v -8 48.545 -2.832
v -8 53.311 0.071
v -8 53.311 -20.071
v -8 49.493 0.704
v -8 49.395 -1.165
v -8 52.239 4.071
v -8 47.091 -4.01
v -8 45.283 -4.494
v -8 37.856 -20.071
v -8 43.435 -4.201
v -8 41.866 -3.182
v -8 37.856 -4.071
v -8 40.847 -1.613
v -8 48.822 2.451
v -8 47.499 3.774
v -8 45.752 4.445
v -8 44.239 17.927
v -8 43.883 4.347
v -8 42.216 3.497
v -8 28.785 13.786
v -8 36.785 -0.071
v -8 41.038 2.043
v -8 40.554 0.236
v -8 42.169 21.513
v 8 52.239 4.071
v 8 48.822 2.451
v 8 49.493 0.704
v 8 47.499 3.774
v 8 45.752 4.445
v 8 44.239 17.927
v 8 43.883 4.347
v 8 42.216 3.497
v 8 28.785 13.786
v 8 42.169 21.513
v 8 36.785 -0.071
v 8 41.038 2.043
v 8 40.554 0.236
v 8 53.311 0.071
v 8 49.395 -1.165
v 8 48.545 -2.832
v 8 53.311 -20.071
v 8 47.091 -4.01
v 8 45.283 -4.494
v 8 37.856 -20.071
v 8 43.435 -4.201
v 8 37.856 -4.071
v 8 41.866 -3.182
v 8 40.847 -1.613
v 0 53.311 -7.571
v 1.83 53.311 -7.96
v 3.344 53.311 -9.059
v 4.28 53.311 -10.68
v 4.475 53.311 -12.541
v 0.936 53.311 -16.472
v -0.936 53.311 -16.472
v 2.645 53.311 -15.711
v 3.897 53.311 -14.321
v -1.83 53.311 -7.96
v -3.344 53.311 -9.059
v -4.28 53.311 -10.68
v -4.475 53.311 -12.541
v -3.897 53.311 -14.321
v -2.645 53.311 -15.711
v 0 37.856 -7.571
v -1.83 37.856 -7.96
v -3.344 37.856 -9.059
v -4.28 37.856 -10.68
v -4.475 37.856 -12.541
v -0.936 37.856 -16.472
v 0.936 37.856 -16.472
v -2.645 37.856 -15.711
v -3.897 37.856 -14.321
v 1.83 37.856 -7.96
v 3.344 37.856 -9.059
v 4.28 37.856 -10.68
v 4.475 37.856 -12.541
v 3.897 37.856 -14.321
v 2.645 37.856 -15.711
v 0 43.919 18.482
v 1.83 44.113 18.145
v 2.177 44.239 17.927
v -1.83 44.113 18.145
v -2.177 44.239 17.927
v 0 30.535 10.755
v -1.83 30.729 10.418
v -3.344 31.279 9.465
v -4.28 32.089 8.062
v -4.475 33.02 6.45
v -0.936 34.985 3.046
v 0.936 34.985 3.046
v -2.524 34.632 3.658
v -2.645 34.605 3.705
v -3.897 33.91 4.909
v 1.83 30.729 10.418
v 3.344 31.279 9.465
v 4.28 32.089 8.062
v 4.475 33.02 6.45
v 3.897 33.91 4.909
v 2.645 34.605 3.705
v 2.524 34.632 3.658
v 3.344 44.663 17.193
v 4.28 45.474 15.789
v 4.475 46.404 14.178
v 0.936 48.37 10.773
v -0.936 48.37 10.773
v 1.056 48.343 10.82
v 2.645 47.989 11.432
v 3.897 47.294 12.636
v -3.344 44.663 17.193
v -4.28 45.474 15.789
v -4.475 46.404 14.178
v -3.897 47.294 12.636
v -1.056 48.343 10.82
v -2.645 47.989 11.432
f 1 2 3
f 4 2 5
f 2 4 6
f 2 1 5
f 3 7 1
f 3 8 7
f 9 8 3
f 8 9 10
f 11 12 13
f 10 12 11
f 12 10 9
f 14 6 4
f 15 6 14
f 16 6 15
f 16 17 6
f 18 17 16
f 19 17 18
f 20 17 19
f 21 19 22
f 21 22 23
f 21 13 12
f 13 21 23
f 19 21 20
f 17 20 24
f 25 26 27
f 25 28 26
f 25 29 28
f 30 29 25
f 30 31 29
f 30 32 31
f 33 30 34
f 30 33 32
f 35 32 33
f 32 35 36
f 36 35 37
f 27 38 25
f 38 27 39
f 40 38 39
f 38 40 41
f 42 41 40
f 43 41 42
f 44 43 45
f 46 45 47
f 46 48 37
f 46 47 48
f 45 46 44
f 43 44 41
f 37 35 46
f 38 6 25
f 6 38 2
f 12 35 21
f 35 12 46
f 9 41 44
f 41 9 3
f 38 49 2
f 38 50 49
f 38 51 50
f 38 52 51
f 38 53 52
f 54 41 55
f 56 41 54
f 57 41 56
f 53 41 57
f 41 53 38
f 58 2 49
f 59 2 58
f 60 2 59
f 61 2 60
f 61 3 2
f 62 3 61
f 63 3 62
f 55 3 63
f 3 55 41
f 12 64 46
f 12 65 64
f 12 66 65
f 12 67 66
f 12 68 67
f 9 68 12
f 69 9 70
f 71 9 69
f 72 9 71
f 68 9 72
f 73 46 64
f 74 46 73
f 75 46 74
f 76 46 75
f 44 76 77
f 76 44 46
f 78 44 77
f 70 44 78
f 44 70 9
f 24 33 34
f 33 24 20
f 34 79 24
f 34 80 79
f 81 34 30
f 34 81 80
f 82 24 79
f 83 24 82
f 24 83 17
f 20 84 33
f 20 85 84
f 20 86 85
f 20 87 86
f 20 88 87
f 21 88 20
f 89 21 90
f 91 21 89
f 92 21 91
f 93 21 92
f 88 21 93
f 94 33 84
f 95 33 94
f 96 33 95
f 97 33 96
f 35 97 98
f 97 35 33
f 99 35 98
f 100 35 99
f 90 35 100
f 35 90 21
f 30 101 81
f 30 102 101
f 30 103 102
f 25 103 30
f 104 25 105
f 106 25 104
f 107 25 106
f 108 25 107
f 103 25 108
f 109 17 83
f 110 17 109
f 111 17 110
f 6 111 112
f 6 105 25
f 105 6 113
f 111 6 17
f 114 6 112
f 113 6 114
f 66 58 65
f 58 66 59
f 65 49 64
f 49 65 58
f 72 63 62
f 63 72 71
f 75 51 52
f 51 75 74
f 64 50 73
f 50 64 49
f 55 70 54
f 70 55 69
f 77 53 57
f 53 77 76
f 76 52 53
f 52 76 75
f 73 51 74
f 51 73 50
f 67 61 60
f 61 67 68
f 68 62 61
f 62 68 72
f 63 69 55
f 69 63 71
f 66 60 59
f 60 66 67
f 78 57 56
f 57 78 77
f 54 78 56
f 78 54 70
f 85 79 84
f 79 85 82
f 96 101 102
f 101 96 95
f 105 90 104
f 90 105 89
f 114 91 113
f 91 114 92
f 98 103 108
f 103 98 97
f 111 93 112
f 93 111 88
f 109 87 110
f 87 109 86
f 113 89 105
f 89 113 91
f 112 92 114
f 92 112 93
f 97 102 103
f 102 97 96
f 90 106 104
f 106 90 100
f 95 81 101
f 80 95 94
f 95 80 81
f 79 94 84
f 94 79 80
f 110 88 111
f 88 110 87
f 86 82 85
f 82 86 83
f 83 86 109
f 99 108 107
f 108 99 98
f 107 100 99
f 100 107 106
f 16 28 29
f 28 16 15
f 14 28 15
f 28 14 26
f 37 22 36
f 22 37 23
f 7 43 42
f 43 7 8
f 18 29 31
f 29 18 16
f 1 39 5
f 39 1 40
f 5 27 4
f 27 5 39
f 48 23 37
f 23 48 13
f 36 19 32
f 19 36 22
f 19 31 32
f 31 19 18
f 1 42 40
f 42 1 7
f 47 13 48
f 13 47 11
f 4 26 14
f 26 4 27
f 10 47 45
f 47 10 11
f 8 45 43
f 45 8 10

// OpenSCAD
h=8;
w=16;
a=15;
d=9;
machine_width=150;
function vertex_thickness(a)=w*cos(a);
function vertex_pivot_long(a)=0.5*w/sin(a)+h*cos(a)+w/2;
function vertex_pivot_short(a)=0.5*w/tan(a)+h+w*cos(a)/2;
function vertex_width(a)=cos(2*a)*0.5*w/tan(a)-0.5*w*sin(2*a)-vertex_pivot_short(a)-vertex_thickness(a)/2;
function between_rods(a)=vertex_pivot_long(a)*sin(a);
module vertex(a){
  difference() {
    union() {
      rotate([0,0,-a])translate([0,vertex_pivot_long(a),0])cube([2*h*sin(a),w,w],center=true);
      translate([0,vertex_pivot_short(a),0])cube([w,w*cos(a),w],center=true);
      translate([w*sin(a),vertex_pivot_short(a),0])cube([w,w*cos(a),w],center=true);
      rotate([0,0,-2*a])translate([0,vertex_pivot_short(a),0])cube([w,w*cos(a),w],center=true);
      rotate([0,0,-2*a])translate([-w*sin(a),vertex_pivot_short(a),0])cube([w,w*cos(a),w],center=true);
      *rotate([0,0,-2*a])translate([0,0.5*w/tan(a)+h/2,0])cube([w,h,w],center=true);
    }
    translate([0,vertex_pivot_short(a),0])rotate([90,0,0])cylinder(h=w+2,d=d,center=true);
    rotate([0,0,-2*a])translate([0,vertex_pivot_short(a),0])rotate([90,0,0])cylinder(h=w+2,d=d,center=true);
    #rotate([0,0,-a])translate([0,vertex_pivot_long(a),0])cylinder(h=w+2,d=d,center=true);
  }
}
translate([0,0,-between_rods(a)])rotate([0,-90,0])vertex(a);
